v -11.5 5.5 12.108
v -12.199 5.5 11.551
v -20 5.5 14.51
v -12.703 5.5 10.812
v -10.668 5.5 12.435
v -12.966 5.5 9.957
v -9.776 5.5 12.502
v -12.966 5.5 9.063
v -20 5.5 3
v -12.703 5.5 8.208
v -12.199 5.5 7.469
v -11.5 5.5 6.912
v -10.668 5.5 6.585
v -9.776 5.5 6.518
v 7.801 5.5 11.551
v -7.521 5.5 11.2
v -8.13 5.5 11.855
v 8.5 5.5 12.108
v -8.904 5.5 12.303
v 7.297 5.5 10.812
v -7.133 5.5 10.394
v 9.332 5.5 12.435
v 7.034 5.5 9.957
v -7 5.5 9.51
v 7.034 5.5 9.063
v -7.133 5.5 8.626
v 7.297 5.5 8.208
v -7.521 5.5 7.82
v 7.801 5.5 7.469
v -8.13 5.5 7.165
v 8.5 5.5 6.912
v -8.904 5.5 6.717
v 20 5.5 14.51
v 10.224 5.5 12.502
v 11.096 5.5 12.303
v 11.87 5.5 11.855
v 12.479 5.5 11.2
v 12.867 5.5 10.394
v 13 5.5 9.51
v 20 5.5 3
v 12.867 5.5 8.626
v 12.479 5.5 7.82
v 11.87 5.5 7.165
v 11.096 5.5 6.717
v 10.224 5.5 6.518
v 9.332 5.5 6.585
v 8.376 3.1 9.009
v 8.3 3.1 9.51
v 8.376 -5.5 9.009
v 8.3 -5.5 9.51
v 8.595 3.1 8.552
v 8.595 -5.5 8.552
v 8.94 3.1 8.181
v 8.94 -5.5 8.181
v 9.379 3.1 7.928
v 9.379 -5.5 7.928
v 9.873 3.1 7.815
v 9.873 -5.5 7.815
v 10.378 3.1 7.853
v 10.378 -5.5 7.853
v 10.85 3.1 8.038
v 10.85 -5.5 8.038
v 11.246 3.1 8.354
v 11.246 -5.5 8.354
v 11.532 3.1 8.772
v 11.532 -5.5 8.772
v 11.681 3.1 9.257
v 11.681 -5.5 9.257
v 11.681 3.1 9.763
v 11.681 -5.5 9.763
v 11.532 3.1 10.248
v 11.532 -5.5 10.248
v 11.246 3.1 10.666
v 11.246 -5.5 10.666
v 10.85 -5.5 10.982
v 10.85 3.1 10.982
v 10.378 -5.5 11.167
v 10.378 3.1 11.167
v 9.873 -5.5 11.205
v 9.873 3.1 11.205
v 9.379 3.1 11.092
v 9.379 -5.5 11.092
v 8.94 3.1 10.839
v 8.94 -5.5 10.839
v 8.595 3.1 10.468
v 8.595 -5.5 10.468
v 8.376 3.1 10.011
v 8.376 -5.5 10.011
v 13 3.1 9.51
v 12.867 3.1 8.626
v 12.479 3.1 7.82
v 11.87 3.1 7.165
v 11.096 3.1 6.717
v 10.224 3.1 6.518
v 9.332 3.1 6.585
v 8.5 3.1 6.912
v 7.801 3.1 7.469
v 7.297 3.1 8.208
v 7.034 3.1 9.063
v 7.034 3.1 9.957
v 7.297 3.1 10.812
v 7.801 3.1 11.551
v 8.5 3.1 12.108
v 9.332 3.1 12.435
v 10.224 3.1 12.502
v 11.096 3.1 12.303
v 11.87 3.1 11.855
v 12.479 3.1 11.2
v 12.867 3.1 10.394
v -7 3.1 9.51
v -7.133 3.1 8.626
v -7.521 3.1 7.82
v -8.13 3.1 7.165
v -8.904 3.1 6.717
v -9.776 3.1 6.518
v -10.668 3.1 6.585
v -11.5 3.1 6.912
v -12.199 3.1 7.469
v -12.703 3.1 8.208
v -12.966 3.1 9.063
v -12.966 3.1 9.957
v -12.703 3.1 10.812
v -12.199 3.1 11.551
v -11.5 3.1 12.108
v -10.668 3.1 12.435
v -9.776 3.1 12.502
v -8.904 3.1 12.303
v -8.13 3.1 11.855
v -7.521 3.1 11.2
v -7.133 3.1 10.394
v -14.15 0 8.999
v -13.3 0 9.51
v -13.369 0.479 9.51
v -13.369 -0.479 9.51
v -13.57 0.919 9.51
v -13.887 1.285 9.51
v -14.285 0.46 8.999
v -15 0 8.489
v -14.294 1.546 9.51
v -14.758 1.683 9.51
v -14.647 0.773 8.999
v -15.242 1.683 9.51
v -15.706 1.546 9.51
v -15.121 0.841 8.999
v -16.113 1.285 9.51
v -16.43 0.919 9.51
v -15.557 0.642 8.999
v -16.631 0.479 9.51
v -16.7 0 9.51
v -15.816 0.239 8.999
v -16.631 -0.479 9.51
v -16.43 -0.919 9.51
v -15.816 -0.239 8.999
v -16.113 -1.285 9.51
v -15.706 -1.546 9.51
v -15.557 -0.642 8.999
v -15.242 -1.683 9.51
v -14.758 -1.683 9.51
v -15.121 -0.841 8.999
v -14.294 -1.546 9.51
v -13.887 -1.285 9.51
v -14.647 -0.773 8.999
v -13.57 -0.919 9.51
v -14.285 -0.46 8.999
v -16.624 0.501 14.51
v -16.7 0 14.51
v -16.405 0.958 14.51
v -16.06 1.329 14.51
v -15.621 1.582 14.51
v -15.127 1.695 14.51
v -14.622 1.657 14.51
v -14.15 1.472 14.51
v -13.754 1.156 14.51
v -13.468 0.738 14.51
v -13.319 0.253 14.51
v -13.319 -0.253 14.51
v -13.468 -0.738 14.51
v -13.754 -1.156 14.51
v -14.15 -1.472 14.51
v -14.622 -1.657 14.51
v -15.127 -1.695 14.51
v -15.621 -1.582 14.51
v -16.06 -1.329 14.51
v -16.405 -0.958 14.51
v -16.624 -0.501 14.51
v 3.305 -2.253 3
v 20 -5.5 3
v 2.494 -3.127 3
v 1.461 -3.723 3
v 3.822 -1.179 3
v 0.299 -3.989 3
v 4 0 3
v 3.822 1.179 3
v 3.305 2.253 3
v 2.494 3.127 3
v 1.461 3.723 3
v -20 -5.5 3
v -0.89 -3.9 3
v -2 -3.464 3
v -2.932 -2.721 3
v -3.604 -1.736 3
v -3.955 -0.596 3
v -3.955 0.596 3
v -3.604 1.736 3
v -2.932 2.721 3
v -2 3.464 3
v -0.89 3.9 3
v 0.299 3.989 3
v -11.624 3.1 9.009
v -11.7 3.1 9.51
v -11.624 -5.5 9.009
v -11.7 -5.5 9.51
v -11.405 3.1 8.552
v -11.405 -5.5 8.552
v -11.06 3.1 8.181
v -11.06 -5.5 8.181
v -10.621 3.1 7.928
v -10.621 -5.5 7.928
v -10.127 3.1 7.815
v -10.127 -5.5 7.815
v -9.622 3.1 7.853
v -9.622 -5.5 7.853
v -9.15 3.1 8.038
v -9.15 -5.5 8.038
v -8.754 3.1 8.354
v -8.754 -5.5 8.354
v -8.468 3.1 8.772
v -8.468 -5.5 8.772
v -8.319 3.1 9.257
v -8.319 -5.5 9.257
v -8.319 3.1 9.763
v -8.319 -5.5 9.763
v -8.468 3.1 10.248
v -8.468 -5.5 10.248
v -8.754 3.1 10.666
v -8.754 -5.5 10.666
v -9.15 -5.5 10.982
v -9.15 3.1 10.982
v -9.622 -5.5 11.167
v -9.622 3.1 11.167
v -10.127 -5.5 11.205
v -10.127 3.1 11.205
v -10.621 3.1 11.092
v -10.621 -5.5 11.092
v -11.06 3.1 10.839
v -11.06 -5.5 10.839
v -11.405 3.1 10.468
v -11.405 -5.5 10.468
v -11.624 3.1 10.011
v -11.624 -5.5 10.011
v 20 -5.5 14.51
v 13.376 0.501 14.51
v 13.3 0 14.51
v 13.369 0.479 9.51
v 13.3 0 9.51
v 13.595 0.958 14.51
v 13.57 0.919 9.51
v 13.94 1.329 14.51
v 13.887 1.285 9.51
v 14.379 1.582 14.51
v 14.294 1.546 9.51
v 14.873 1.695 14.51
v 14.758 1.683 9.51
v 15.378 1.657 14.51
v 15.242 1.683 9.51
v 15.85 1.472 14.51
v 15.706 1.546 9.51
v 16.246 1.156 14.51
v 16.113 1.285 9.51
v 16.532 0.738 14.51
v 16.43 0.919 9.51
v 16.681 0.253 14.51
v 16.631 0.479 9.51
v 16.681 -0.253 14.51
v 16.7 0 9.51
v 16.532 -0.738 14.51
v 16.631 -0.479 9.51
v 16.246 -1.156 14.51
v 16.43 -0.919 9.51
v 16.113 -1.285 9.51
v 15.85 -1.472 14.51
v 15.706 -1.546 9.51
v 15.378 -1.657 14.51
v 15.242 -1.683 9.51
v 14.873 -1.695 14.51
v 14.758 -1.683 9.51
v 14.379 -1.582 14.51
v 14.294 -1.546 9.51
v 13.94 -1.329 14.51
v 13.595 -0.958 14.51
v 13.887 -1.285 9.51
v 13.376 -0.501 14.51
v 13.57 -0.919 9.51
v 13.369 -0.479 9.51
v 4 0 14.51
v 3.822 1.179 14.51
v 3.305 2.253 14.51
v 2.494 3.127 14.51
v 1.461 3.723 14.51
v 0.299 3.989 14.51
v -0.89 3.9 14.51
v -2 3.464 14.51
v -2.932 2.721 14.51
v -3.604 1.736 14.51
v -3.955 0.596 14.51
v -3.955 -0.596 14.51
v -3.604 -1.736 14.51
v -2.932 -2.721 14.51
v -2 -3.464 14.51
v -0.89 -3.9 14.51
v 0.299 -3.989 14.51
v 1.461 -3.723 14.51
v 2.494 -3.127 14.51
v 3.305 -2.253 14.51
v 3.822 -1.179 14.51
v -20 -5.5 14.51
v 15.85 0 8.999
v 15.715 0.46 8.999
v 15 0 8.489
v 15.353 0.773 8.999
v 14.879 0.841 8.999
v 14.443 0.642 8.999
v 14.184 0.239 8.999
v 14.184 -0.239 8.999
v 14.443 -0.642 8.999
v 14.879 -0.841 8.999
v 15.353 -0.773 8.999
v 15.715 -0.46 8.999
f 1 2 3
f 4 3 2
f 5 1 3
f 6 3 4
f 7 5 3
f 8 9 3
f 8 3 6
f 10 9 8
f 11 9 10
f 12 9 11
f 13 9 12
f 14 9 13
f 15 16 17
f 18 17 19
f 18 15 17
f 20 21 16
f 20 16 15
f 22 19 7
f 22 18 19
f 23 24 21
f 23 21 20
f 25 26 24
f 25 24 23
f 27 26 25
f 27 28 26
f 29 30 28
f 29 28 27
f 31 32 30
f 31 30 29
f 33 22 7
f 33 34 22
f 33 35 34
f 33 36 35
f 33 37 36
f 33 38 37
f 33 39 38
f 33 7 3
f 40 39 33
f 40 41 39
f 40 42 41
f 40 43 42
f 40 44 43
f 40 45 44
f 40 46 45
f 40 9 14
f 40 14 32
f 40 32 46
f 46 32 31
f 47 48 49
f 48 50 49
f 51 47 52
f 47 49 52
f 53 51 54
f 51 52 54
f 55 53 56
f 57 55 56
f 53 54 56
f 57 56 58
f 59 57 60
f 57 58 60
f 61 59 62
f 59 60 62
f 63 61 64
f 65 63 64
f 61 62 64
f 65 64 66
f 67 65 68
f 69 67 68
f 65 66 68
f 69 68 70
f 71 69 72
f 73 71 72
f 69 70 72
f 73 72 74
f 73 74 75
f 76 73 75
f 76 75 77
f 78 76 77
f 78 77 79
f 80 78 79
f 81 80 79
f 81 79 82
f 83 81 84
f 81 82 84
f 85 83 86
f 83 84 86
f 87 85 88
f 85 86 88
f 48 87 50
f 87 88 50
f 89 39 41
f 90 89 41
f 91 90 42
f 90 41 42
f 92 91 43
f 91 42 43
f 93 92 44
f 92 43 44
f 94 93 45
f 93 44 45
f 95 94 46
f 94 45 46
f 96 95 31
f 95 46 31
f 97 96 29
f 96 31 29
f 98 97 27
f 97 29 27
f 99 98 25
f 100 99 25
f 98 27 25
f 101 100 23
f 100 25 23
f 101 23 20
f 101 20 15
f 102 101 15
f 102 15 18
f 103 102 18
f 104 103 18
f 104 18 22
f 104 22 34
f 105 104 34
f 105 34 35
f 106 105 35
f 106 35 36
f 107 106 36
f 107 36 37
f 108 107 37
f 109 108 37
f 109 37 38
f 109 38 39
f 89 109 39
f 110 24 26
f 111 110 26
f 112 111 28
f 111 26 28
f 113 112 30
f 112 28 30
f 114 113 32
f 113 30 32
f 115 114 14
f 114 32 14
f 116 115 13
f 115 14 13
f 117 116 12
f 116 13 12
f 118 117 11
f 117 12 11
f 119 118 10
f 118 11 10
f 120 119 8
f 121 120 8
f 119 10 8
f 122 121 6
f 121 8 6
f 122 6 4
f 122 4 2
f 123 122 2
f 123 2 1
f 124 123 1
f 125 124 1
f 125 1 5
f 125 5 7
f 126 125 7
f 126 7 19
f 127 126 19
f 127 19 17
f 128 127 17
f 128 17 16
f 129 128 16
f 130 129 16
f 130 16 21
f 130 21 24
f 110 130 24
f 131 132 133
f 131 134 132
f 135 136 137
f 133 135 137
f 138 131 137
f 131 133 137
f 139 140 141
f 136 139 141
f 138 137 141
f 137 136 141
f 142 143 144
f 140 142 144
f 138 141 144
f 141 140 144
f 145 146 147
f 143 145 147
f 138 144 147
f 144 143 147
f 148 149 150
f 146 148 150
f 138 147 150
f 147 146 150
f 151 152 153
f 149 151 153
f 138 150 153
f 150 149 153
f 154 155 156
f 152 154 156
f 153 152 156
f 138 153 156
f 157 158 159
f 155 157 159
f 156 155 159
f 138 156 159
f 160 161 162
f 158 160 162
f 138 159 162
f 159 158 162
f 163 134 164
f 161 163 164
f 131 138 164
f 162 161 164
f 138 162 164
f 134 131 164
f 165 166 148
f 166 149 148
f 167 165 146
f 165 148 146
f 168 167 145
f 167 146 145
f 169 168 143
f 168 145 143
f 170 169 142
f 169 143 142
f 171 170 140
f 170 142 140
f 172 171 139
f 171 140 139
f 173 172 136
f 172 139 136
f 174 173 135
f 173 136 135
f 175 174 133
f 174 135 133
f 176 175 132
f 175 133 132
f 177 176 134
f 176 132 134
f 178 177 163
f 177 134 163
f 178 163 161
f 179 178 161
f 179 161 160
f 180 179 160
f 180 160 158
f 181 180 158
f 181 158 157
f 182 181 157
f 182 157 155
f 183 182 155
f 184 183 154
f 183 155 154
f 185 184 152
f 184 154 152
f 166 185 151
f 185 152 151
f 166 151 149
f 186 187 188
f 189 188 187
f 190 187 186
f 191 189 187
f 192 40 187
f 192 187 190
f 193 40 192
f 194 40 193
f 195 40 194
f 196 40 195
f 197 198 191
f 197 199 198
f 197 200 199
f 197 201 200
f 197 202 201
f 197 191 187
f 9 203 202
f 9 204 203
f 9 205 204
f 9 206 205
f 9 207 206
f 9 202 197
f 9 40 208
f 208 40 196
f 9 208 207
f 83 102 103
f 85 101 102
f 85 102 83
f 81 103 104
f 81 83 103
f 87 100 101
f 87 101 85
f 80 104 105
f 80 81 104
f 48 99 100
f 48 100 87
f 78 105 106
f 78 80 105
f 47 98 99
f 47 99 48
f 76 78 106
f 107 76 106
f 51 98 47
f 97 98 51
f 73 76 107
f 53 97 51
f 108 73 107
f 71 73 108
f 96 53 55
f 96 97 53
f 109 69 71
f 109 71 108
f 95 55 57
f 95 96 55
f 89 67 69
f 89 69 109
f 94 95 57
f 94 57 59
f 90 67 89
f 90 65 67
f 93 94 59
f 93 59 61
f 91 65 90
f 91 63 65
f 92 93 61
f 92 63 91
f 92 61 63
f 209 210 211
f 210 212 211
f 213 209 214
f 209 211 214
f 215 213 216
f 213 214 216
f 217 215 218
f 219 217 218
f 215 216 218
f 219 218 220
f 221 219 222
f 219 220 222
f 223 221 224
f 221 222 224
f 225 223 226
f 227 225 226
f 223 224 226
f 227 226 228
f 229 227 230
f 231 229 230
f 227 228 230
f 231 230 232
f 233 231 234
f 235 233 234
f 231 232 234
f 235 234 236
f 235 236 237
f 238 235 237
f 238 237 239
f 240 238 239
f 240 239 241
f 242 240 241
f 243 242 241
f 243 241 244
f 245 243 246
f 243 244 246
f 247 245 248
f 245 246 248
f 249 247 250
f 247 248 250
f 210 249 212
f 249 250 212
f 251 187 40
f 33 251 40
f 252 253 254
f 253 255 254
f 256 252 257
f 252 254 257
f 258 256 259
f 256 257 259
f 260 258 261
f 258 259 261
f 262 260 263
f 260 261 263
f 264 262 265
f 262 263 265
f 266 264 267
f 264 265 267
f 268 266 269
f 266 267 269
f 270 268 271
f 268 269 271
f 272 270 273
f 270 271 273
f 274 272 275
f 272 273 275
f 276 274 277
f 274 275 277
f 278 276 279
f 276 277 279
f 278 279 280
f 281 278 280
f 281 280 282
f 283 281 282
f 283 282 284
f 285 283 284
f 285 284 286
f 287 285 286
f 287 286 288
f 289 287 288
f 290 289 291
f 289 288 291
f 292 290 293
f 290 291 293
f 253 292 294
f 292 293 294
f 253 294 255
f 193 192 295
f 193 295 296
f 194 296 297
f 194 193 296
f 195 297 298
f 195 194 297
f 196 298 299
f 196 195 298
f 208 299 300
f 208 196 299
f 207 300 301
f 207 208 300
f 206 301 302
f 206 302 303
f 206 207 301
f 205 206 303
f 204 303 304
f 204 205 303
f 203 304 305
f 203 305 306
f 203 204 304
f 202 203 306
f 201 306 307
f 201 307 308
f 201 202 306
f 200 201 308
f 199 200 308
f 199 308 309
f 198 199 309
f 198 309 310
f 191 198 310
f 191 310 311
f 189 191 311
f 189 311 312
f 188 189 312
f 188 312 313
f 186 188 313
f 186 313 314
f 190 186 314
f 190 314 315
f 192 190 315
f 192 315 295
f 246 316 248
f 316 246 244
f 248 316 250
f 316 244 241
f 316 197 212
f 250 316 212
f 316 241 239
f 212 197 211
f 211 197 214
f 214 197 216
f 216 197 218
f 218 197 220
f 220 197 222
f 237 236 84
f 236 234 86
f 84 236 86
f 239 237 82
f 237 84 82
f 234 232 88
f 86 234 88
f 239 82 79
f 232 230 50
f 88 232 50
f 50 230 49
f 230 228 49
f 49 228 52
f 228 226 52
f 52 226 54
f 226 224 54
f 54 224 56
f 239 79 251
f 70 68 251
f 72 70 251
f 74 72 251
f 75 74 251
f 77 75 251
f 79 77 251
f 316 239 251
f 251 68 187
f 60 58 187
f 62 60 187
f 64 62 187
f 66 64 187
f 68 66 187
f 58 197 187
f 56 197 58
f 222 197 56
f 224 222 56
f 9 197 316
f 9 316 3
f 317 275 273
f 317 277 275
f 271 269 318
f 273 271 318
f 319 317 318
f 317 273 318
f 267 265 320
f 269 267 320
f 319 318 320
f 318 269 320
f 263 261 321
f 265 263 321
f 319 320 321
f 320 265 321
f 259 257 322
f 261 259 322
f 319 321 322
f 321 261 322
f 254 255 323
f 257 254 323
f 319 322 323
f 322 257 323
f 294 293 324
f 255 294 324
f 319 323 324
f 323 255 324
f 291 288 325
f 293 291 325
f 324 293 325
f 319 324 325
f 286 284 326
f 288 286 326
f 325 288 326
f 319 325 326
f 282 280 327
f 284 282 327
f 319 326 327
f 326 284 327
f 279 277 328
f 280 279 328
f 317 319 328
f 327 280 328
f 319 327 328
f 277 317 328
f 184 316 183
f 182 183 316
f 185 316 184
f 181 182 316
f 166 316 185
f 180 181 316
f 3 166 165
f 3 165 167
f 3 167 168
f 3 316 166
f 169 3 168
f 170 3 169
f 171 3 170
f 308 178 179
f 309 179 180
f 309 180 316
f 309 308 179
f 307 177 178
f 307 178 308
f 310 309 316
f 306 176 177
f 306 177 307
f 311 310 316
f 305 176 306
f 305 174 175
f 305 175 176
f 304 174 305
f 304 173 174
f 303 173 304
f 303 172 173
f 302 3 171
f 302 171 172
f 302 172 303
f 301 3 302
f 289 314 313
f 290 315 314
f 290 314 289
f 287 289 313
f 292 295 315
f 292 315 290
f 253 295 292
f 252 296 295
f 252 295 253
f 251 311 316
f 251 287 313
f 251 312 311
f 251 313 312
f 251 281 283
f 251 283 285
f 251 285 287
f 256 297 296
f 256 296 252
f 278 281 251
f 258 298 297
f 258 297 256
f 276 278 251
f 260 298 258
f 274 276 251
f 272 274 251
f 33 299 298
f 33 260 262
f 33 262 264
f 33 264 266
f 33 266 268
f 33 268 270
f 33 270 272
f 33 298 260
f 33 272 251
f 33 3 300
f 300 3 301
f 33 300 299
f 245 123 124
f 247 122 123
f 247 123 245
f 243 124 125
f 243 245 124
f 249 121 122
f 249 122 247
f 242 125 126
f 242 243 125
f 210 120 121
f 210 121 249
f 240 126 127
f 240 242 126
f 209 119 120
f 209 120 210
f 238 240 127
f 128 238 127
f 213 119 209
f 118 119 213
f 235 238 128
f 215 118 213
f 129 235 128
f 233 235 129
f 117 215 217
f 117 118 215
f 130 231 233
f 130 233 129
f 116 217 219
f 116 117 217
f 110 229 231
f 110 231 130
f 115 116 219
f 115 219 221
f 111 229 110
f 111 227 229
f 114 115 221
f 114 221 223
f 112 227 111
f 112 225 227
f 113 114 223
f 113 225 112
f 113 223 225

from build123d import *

# Parameters (mm, degrees)
ESQUISSE1_W                                        = 40
ESQUISSE1_H                                        = 11
ESQUISSE1_R                                        = 4
BOSS_EXTRU_1_DEPTH                                 = 10.51
ESQUISSE16_W                                       = 40
ESQUISSE16_H                                       = 11
BOSS_EXTRU_2_DEPTH                                 = 7
D_GAGEMENT_M32_D                                   = 2.5
CHAMBRAGE_POUR_VIS_T_TE_RONDE_BOMB_E_M_D           = 3.4
CHAMBRAGE_POUR_VIS_T_TE_RONDE_BOMB_E_M_CBORE_D     = 6
CHAMBRAGE_POUR_VIS_T_TE_RONDE_BOMB_E_M_CBORE_DEPTH = 2.4
FRAISAGE_POUR_VIS_T_TE_FRAIS_E_M31_D               = 3.4
FRAISAGE_POUR_VIS_T_TE_FRAIS_E_M31_DEPTH           = 8
FRAISAGE_POUR_VIS_T_TE_FRAIS_E_M31_CSINK_D         = 6.3
FRAISAGE_POUR_VIS_T_TE_FRAIS_E_M31_CSINK_ANGLE     = 90
FRAISAGE_POUR_VIS_T_TE_FRAIS_E_M31_TIP             = 1.021463052
ESQUISSE33_W                                       = 100.854971174
ESQUISSE33_H                                       = 90.146734576
ENL_V_MAT_EXTRU_4_DEPTH                            = 3
ESQUISSE34_R                                       = 4
ENL_V_MAT_EXTRU_5_DEPTH                            = 10
ESQUISSE35_W                                       = 78.795727906
ESQUISSE35_H                                       = 40.956962542
ENL_V_MAT_EXTRU_6_DEPTH                            = 3


with BuildPart() as part:
    # Esquisse1 → Boss.-Extru.1 (new body)
    with BuildSketch(Plane.XY):
        Rectangle(ESQUISSE1_W, ESQUISSE1_H)
        Circle(ESQUISSE1_R, mode=Mode.SUBTRACT)
    extrude(amount=BOSS_EXTRU_1_DEPTH)

    # Esquisse16 → Boss.-Extru.2 (add)
    with BuildSketch(Plane.XY.offset(10.51)):
        Rectangle(ESQUISSE16_W, ESQUISSE16_H)
    extrude(amount=BOSS_EXTRU_2_DEPTH)

    # Dégagement M32 (through all)
    with Locations(Plane.XY.offset(17.51)):
        with Locations((0, 0)):
            Hole(D_GAGEMENT_M32_D / 2)

    # Chambrage pour vis _ t_te ronde bomb_e M (through all)
    with Locations(Plane(origin=(0, 5.5, 0), x_dir=(1, 0, 0), z_dir=(0, 1, 0))):
        with Locations((10, -9.51), (-10, -9.51)):
            CounterBoreHole(CHAMBRAGE_POUR_VIS_T_TE_RONDE_BOMB_E_M_D / 2, CHAMBRAGE_POUR_VIS_T_TE_RONDE_BOMB_E_M_CBORE_D / 2, CHAMBRAGE_POUR_VIS_T_TE_RONDE_BOMB_E_M_CBORE_DEPTH)

    # Fraisage pour vis à tête fraisée M31
    with Locations(Plane.XY.offset(17.51)):
        with Locations((-15, 0), (15, 0)):
            CounterSinkHole(FRAISAGE_POUR_VIS_T_TE_FRAIS_E_M31_D / 2, FRAISAGE_POUR_VIS_T_TE_FRAIS_E_M31_CSINK_D / 2, depth=FRAISAGE_POUR_VIS_T_TE_FRAIS_E_M31_DEPTH, counter_sink_angle=FRAISAGE_POUR_VIS_T_TE_FRAIS_E_M31_CSINK_ANGLE)
            with Locations((0, 0, -(FRAISAGE_POUR_VIS_T_TE_FRAIS_E_M31_DEPTH + FRAISAGE_POUR_VIS_T_TE_FRAIS_E_M31_TIP / 2))):  # 118° drill point
                Cone(0, FRAISAGE_POUR_VIS_T_TE_FRAIS_E_M31_D / 2, FRAISAGE_POUR_VIS_T_TE_FRAIS_E_M31_TIP, mode=Mode.SUBTRACT)

    # Esquisse33 → Enlèv. mat.-Extru.4 (cut)
    with BuildSketch(Plane.XY.offset(17.51)):
        Rectangle(ESQUISSE33_W, ESQUISSE33_H)
    extrude(amount=-ENL_V_MAT_EXTRU_4_DEPTH, mode=Mode.SUBTRACT)

    # Esquisse34 → Enlèv. mat.-Extru.5 (cut)
    with BuildSketch(Plane.XY.offset(14.51)):
        Circle(ESQUISSE34_R)
    extrude(amount=-ENL_V_MAT_EXTRU_5_DEPTH, mode=Mode.SUBTRACT)

    # Esquisse35 → Enlèv. mat.-Extru.6 (cut)
    with BuildSketch(Plane(origin=(0, 0, 0), x_dir=(-1, 0, 0), z_dir=(0, 0, -1))):
        Rectangle(ESQUISSE35_W, ESQUISSE35_H)
    extrude(amount=-ENL_V_MAT_EXTRU_6_DEPTH, mode=Mode.SUBTRACT)


solid = part.part
